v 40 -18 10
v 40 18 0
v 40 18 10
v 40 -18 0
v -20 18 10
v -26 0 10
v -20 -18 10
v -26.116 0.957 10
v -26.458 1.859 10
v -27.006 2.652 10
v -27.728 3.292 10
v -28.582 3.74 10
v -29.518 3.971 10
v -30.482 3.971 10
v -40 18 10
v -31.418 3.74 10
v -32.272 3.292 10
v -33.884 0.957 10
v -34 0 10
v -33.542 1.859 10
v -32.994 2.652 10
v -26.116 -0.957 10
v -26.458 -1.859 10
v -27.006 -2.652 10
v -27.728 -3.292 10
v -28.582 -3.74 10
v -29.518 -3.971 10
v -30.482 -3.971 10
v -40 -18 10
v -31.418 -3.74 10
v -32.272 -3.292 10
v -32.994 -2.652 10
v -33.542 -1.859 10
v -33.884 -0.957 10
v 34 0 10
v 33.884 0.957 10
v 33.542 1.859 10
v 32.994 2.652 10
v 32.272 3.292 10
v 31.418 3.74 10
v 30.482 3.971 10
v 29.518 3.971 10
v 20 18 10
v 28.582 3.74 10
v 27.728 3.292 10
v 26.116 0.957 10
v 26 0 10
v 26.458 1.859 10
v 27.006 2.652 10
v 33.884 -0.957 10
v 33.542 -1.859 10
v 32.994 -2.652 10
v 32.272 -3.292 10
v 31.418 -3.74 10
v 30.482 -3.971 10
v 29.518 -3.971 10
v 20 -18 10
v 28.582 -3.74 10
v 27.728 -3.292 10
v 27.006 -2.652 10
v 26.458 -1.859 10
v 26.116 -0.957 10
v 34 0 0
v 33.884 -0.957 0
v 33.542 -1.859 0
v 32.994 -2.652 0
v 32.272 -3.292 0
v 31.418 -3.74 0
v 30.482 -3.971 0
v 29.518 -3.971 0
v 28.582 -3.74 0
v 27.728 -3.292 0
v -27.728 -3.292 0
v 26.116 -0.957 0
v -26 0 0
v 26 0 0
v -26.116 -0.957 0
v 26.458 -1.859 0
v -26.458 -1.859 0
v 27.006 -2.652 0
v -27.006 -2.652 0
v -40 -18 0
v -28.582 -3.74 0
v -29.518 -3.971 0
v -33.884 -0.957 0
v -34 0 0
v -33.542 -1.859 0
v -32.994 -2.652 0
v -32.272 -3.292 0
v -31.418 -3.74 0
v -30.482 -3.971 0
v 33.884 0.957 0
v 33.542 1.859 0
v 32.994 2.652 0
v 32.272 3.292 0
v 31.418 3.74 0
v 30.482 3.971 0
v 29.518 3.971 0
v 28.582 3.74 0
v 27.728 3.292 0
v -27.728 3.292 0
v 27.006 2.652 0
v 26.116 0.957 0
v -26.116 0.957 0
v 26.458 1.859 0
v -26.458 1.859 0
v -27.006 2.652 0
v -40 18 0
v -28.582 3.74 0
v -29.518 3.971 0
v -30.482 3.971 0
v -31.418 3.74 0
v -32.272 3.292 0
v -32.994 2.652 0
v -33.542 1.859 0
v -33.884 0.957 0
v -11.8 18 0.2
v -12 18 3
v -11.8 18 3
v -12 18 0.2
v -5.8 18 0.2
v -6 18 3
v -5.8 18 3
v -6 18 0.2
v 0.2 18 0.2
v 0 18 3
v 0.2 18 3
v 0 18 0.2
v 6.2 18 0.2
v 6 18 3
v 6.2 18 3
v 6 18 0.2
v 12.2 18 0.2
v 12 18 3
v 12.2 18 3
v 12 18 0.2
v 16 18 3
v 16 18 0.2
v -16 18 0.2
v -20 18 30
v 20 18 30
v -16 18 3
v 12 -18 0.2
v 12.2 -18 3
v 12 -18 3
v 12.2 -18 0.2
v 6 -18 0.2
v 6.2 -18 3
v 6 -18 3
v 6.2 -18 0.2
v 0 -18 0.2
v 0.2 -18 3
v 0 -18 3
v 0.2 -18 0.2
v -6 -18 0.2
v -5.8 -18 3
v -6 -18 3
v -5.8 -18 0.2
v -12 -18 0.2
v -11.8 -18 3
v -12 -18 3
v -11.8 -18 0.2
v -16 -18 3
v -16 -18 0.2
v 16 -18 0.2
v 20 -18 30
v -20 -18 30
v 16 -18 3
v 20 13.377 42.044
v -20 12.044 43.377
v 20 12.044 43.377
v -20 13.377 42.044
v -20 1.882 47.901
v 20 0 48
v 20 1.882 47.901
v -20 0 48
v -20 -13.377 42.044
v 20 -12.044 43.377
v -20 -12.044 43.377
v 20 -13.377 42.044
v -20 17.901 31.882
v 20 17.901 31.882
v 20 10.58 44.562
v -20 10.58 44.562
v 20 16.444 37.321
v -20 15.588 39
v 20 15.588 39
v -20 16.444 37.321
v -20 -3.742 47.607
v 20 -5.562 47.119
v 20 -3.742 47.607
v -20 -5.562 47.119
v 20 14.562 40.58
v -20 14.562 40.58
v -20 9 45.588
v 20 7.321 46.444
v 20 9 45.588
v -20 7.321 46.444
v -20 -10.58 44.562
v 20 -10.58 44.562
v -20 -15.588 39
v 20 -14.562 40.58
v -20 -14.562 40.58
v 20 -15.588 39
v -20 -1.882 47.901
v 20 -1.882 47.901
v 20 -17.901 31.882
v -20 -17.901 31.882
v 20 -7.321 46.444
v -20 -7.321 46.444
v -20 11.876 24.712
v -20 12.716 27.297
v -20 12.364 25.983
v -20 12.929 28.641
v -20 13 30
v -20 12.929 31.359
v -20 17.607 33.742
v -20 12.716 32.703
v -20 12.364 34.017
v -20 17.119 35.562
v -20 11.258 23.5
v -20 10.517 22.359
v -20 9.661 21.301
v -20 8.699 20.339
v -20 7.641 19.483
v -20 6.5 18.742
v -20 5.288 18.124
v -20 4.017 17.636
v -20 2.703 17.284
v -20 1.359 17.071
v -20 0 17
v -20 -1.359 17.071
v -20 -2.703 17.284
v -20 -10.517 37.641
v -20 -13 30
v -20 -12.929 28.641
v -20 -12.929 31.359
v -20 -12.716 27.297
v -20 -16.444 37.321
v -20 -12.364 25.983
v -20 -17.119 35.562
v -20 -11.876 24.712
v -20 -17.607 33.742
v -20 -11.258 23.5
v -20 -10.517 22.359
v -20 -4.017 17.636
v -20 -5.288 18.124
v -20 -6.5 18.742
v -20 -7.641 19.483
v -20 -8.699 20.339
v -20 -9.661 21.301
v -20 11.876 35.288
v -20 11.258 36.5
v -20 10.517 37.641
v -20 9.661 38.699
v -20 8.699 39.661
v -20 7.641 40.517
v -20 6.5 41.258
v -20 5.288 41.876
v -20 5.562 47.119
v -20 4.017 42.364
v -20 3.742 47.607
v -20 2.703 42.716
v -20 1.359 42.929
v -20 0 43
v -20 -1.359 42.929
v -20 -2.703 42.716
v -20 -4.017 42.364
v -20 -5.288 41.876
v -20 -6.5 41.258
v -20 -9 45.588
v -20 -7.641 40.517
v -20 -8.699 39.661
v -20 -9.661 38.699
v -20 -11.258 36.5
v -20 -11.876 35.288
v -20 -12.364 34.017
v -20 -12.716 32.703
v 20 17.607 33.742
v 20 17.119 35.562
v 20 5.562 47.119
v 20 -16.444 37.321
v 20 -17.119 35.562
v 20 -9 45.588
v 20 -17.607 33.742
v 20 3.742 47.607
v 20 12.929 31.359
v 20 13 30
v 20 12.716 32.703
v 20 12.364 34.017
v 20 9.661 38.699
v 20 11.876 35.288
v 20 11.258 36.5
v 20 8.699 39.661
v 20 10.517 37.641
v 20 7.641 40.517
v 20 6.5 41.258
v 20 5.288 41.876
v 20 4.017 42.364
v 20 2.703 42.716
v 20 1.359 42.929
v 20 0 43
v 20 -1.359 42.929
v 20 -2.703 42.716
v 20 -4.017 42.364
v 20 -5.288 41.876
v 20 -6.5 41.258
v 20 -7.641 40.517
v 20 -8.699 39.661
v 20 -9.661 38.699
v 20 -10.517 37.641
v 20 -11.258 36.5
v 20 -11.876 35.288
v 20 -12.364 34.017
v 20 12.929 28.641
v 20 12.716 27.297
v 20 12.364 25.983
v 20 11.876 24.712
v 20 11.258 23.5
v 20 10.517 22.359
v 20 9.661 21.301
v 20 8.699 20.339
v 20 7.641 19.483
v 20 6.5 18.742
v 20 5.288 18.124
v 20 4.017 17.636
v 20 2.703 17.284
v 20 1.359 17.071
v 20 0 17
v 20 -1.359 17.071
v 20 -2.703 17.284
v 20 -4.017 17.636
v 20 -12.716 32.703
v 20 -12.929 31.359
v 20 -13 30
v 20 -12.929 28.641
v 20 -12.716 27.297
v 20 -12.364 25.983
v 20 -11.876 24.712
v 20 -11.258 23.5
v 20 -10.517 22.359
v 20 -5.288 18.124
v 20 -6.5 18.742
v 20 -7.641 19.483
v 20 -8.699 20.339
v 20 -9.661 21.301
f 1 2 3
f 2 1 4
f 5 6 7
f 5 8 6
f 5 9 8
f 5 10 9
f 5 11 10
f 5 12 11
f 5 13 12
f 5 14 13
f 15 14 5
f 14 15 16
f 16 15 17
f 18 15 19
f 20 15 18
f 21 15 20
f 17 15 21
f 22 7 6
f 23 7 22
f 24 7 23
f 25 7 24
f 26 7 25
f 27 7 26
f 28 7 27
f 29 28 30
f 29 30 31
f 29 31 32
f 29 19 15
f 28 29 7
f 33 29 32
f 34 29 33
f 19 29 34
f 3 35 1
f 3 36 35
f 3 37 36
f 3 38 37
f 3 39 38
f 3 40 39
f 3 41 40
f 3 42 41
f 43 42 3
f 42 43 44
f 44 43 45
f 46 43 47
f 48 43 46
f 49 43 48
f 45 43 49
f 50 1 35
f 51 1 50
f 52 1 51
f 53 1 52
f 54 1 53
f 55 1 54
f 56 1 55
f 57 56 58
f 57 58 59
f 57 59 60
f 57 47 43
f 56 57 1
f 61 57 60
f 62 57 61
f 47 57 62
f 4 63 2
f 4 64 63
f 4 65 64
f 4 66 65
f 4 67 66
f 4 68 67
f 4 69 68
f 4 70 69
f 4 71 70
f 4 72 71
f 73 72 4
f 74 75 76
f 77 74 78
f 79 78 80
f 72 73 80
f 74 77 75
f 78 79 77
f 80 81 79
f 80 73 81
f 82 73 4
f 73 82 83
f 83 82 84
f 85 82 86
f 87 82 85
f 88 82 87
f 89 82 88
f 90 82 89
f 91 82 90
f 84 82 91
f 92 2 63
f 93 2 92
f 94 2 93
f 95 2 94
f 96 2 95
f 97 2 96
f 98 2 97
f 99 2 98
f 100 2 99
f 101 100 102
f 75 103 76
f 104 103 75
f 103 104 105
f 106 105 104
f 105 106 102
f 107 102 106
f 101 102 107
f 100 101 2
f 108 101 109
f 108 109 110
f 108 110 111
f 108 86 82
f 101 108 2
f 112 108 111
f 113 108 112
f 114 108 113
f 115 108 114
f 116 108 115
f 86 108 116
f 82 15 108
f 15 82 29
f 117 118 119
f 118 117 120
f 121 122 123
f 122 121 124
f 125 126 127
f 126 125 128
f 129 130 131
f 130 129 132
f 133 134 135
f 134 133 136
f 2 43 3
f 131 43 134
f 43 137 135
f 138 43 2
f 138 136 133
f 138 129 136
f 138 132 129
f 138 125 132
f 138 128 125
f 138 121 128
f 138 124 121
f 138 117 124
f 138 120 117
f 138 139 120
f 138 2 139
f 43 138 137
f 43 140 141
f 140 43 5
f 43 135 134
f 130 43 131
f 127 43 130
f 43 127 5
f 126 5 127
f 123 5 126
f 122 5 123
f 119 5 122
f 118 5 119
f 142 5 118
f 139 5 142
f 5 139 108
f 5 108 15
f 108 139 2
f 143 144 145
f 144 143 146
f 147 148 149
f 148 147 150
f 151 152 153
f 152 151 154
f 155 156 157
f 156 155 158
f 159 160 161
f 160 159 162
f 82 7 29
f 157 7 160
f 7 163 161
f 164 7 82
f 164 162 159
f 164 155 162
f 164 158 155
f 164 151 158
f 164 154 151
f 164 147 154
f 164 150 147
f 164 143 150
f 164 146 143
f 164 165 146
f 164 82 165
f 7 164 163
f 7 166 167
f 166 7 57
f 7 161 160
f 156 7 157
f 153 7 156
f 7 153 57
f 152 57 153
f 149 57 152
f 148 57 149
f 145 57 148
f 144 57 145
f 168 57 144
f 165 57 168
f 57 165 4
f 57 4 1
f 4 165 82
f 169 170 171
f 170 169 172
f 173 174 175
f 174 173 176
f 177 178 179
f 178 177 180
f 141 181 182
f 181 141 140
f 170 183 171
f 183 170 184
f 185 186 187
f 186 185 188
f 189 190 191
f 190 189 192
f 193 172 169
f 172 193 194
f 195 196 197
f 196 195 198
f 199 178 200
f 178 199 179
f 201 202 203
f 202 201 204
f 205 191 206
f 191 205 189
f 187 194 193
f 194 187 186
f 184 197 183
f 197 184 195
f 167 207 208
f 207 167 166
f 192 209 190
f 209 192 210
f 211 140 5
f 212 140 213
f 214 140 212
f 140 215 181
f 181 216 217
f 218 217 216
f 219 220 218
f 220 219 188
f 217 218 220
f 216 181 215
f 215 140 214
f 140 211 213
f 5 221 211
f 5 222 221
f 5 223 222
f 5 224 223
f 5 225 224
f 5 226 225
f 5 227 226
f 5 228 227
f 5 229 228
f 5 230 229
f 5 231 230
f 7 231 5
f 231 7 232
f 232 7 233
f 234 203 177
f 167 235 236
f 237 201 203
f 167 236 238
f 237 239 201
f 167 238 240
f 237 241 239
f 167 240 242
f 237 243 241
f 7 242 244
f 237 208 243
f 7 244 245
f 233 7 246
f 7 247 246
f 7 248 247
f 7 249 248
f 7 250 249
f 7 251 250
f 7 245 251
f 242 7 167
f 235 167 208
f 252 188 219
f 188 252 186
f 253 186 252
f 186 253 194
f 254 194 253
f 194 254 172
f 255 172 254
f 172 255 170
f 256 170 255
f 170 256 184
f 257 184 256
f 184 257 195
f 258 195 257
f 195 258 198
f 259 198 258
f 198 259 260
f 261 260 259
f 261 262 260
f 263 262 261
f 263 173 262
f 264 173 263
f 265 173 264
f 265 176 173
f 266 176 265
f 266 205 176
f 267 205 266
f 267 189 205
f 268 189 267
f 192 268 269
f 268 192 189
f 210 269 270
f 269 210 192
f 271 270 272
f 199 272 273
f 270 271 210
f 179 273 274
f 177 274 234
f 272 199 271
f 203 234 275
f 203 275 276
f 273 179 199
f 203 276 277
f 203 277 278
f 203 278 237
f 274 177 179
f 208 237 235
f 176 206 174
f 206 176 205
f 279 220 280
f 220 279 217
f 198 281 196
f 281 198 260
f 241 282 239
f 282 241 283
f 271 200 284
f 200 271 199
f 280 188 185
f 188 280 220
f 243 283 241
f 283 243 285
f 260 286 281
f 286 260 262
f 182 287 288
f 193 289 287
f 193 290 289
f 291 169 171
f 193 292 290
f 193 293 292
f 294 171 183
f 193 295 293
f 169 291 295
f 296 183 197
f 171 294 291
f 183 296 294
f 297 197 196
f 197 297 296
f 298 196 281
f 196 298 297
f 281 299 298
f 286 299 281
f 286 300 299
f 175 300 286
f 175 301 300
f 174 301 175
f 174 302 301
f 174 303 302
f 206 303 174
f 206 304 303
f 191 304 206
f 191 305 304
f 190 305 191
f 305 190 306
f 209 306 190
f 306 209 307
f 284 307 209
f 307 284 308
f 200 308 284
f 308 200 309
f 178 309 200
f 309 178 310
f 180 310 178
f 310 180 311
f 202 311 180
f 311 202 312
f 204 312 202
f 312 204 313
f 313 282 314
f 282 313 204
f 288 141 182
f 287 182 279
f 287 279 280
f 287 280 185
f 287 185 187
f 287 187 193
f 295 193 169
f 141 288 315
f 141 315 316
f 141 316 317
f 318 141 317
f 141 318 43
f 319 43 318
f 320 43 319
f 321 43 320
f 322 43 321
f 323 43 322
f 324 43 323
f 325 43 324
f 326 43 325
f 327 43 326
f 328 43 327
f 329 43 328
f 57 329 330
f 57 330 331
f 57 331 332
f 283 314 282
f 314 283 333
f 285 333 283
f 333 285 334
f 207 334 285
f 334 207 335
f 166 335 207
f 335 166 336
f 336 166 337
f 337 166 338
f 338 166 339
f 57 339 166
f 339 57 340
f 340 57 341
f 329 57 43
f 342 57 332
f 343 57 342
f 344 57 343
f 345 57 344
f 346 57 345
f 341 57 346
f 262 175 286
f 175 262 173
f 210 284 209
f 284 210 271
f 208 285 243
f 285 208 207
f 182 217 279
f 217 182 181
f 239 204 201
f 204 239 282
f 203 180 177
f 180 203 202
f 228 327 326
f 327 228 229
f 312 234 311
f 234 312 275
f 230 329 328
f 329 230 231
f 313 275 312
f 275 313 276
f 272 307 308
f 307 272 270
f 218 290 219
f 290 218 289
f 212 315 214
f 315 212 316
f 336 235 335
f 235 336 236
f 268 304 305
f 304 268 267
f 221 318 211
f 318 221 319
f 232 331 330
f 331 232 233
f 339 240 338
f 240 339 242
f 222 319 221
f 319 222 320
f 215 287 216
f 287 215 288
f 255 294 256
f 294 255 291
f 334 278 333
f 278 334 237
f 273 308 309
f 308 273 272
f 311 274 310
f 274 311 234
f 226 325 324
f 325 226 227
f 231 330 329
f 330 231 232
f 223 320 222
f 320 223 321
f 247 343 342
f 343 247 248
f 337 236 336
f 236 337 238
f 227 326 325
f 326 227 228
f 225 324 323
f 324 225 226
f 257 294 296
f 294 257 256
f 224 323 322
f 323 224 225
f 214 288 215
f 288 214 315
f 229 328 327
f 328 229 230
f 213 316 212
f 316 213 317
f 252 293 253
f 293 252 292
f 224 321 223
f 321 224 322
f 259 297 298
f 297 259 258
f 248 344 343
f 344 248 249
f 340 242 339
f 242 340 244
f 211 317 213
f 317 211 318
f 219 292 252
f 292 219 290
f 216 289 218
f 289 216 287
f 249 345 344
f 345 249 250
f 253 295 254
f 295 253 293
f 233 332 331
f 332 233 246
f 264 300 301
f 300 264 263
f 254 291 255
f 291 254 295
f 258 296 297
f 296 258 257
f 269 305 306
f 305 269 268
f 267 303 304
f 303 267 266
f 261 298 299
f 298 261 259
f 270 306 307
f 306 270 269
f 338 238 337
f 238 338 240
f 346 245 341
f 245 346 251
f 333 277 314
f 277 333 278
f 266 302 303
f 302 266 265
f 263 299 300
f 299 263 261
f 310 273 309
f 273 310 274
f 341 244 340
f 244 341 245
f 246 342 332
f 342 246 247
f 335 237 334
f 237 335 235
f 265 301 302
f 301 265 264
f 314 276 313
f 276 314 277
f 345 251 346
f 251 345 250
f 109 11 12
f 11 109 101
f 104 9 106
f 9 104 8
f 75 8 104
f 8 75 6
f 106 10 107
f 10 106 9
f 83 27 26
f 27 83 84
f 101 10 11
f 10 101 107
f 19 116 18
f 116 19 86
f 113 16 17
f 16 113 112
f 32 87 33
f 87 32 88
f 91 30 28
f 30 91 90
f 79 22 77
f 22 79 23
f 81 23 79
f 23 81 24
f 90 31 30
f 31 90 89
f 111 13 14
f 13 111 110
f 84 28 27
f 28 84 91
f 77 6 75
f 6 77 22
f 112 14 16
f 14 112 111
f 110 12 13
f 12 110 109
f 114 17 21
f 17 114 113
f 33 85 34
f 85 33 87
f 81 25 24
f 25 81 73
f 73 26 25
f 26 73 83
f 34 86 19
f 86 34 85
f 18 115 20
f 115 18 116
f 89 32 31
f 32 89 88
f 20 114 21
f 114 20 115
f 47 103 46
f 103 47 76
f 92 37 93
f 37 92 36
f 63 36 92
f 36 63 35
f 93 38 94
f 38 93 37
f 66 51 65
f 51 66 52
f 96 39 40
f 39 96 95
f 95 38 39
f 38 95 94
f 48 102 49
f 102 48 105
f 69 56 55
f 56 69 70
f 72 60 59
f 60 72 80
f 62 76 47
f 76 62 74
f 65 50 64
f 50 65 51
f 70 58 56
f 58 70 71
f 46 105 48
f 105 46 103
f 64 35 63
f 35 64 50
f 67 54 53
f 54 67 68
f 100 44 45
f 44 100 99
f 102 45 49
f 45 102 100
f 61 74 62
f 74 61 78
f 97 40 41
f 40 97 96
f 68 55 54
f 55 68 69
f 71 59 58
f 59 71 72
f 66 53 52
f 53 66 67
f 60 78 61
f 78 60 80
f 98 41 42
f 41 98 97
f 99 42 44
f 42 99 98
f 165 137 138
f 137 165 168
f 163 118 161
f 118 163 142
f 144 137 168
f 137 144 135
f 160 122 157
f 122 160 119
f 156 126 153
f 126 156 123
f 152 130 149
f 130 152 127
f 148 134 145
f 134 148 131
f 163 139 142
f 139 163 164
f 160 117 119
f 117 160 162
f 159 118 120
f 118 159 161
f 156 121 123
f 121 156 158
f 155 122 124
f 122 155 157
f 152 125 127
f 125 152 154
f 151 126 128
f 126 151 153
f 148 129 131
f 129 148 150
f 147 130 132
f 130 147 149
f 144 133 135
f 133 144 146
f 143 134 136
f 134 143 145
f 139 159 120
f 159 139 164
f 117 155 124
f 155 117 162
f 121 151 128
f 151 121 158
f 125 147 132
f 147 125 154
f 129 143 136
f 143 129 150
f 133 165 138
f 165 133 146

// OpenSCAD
use <../../config.scad>

$fs=$fs/2;
$fa=$fa/2;

//translate([100,-70+x,0]) import("component/pi_model_v4.stl");
//translate([-100,59,0])  rotate([90,0,0]) import("component/screen_fond.stl");

screen_l = 193;
screen_lg = 111;
screen_r = 7;

trou_l = 126;
trou_lg = 65;
d_e1 = 2;
d_e2 = 1;
screen_vis = [[trou_l/2+d_e1, trou_lg/2+d_e2], [trou_l/2+d_e1, -trou_lg/2+d_e2]
    , [-trou_l/2+d_e1, trou_lg/2+d_e2], [-trou_l/2+d_e1, -trou_lg/2+d_e2]];


boitier_l = 197;
boitier_lg = 155;
boitier_y = -boitier_lg/2-10;

boitier_vis_l = boitier_l/2-5;
boitier_vis_lg = boitier_lg/2-5;

boitier_h = 40;

vis_r1 = 2.2;
vis_r2 = 4.2;

x =0;


y_camera = -boitier_lg/2+6;

//$fn=50;

module usb(){
    usb_l = 28;
    usb_r = 12/2;
    union(){
        hull(){
            for(i=[-1,1]){
                translate([i*usb_l/2, 0,-20])cylinder(r=usb_r, 20);
            }
        }
        for(i=[-1,1]){
            translate([i*usb_l/2, 0,-1])cylinder(r=1.5, 20);
        }
    }
    
    cube([15,10,6], center= true);
}

module screen_int(){
    screen_l_int = 110;
    screen_lg_int = 90;
    r_int = 10;
    for(vis = screen_vis){
        translate(vis) cylinder(r=2, 20);
    }
    hull(){
        for(i=[-1,1]){
            for(j=[-1,1]){
                translate([i*(screen_l_int/2-r_int)+d_e1, j*(screen_lg_int/2-r_int)+d_e2, 0]) cylinder(r=r_int, 20);
            }
        }
    }
}

module screen(){
    screen_e = 1;
    screen_y = 66;
    
    screen_l_cube = 175;
    screen_lg_cube = 107;
    
    union(){
        hull(){
            for(i=[-1,1]){
                for(j=[-1,1]){
                    translate([i*(screen_l/2-screen_r), j*(screen_lg/2-screen_r), 0]) cylinder(r=screen_r, screen_e);
                }
            }
        }
        translate([-screen_l_cube/2,-screen_lg_cube/2,0]) cube([screen_l_cube,screen_lg_cube, 8.5]);
        translate([-screen_l_cube/2-7,-screen_lg_cube/2,0]) cube([screen_l_cube,screen_lg_cube, 3]);
    
        screen_int();
    }
}

module boitier(h){
    r = 6;
    difference(){
        hull(){
            for(i=[-1,1]){
                for(j=[-1,1]){
                    translate([i*(boitier_l/2-r), j*(boitier_lg/2-r), 0]) cylinder(r=r, h);
                }
            }
        }
    }
        
}


module screen_fond(){
    e = 9.5;
    l = 200;
    lg = 150;
    difference(){
        boitier(e);
        translate([0,x,e+0.1]) mirror([0,0,1])screen();
        
        for(i=[-1,1]){
            for(j=[-1,1]){
                translate([i*(boitier_vis_l), j*(boitier_vis_lg), -1]) cylinder(r=vis_r1, 100);
            }
        }
        
    }
    
    for(i=[-1,1]){
        hull(){
           translate([-boitier_l/2+10,i*65,1]) mirror([0,0,1])cube([boitier_l-20, 2, 1]); 
           translate([-boitier_l/2+20,i*65,21]) mirror([0,0,1])cube([boitier_l-40, 2, 1]);  
        }
    }
}

module screen_up(){
    e = 1.5;
    r = 6;
   difference(){
        mirror([0,1,0])boitier(boitier_h);
        translate([0,0,e+0.1]) rotate([180,0,0]) screen_int();
        hull(){
            for(i=[-1,1]){
                for(j=[-1,1]){
                    translate([i*(boitier_l/2-15), -(boitier_lg/2-15), e]) cylinder(r=5, boitier_h+2);
                    translate([i*(boitier_l/2-15), (boitier_lg/2-15), e]) cylinder(r=5, boitier_h+2);
                }
            }
        }
        
        for(i=[-2:2]){
            hull(){
                translate([boitier_l/2,i*10,10]) rotate([0,90,0])cylinder(r=3, boitier_l/2, center = true);
                translate([boitier_l/2,i*10,boitier_h-10]) rotate([0,90,0])cylinder(r=3, boitier_l/2, center = true);
            }
        }
        
        hull(){
            for(i=[-2:2]){
            translate([-boitier_l/2,i*10,10]) rotate([0,90,0])cylinder(r=3, boitier_l/2, center = true);
            translate([-boitier_l/2,i*10,boitier_h-10]) rotate([0,90,0])cylinder(r=3, boitier_l/2, center = true);
            }
        }
        
         for(i=[-1,1]){
            hull(){
                translate([i*25,0,boitier_h/2]) rotate([-90,0,0])cylinder(r=3.2, 1000, center=true);
                
            }
        }
        
        for(i=[0,1]){
            for(j=[0,1]){
                mirror([i,0]) mirror([0,j])
                    translate([boitier_vis_l, boitier_vis_lg, 10]) rotate([0,0,225])support_nut(3, 11, 11);
            }
        }
        
        for(i=[0,1]){
            for(j=[0,1]){
                mirror([i,0]) mirror([0,j])
                    translate([boitier_vis_l, boitier_vis_lg, boitier_h-10]) rotate([0,0,225])support_nut(3, 11, 11);
                
                mirror([i,0]) mirror([0,j])
                translate([-boitier_l/2+2, 45, boitier_h/2]) rotate([90,0,-90])usb();
            }
            
            
        
        }
        
        for(i=[-0.1, -0.3, 0.1, 0.3]){
            hull(){
                translate([i*boitier_l,0,boitier_h-8]) rotate([90,0,0])cylinder(r=2, 1000);
                
            }
        }
        
        

    }
    
    
}


module screen_up2(){
    e = 1.5;
    r = 6;
    de = 15;
    fond_h = 25;
    difference(){
        mirror([0,1,0])boitier(fond_h);
        
        hull(){
            for(i=[-1,1]){
                for(j=[-1,1]){
                    translate([i*(boitier_l/2-de), -(boitier_lg/2-r-e), e]) cylinder(r=5, fond_h+2);
                    translate([i*(boitier_l/2-r-e), -(boitier_lg/2-de), e]) cylinder(r=5, fond_h+2);
                    translate([i*(boitier_l/2-de), (boitier_lg/2-r-e), e]) cylinder(r=5, fond_h+2);
                    translate([i*(boitier_l/2-r-e), (boitier_lg/2-de), e]) cylinder(r=5, fond_h+2);
                }
            }
        }

        
        for(i=[0,1]){
            for(j=[0,1]){
                mirror([i,0]) mirror([0,j])
                    translate([boitier_vis_l, boitier_vis_lg, -1]) cylinder(r=1.6, 100);
            }
        }
        
        
        for(i=[-1,0,1]){
            translate([boitier_l/2, 10-i*20, fond_h/2]) rotate([0,90,0])cylinder(r=4, 10, center = true);
        }
        
        translate([boitier_l/2, -35, fond_h/2]) cube([100,15,10], center = true);
        
        hull(){
            for(i=[-1,1]){
                translate([-i*30, 50, 0]) cylinder(r=4, 10, center = true);
            }
        }
        
        hull(){
            for(i=[-1,1]){
                translate([-i*30, -50, 0]) cylinder(r=4, 10, center = true);
            }
        }
        

    }
    
    
}



z_rond = 20;
support_camera_rond_r = 10;
module support_camera1(){
    e = 5;
    z= z_rond;
    r1 = 5;
    z1 = 10;
    difference(){
        union(){
            hull(){
                translate([-25,0, 0])  cylinder(r=5, e);
                translate([25,0, 0])  cylinder(r=5, e);
                
                cylinder(r=10, e);
                
            }
            
            hull(){
                translate([0,0, z1])  sphere(r=r1); cylinder(r=10, e);
                
            }
            
             hull(){
                translate([0,0, z])  sphere(r=support_camera_rond_r); 
                translate([0,0, z1])  sphere(r=r1); 
                
            }
        }
        translate([-25,0, -1])  cylinder(r=2, e+2);
        translate([25,0, -1])  cylinder(r=2, e+2);
        
        hull(){
            translate([-12.5, 2, -1]) cube([25,100,2]);
            translate([0,8, 10]) rotate([0,90,0]) cylinder(r=2, 25, center=true);
        }
                
    }
}

module support_camera2(){
    e=3;
    l=38;
    l3=20;
    l2=18;
    r = 4;
    
    dz_rond = 12;
    difference(){
        union(){
            for(i=[0,1]){
                mirror([i,0,0]) translate([l2/2,-l3/2,0])cube([e, l3, l]);
            }
            translate([-l2/2-e,-l3/2,0])cube([l2+2*e, l, e]);
        }
        translate([0,0, z_rond])  rotate([0,90,0])cylinder(r=r, l+e+10, center = true);
        translate([0,0, z_rond - dz_rond])  rotate([0,90,0])cylinder(r=2, l+e+10, center = true);
        translate([0,0, z_rond + dz_rond])  rotate([0,90,0])cylinder(r=2, l+e+10, center = true);
            
        
    }
    
    %translate([0,0, z_rond + dz_rond])  rotate([0,90,0])cylinder(r=2, l+e+10, center = true);
    %translate([0,0, z_rond - dz_rond])  rotate([0,90,0])cylinder(r=2, l+e+10, center = true);
        
    z= 15;
    r1 = 5;
    z1 = 10;
    
}

nb_cran = 24;

module support_ecran1(){
    r1 = 17;
    r2 = 12;
    h = 15+6;
    
    difference(){
        union(){
            hull(){
                translate([-35,0])rotate([0,0,0])cylinder(r=8,5);
                translate([35,0])rotate([0,0,0])cylinder(r=8,5);
                translate([-r1,-r1,0])cube([r1*2,r1*2,5]);
                
                //translate([-r1,-r1,0])cube([r1*2,r1*2,r1*2]);
            }
            for(i=[0,1]){
                mirror([i,0,0])hull(){
                    translate([r2,-r1,0])cube([5,r1*2,6]);
                    translate([r2,0,h])rotate([0,90,0])cylinder(r=8,5);
                }
                mirror([i,0,0])
                    translate([r2,0,h])rotate([0,-90,0]) sphere_cran(8, 1.1, 0.1, nb_cran);
            }
        }
        translate([0,0,h])rotate([0,90,0])cylinder(r=4.2,3*r1, center = true);   
        //translate([-r2,-r1,6])cube([r2*2,r1*2,60]);
        translate([35,0])rotate([0,0,0])cylinder(r=4,40);
        translate([-35,0])rotate([0,0,0])cylinder(r=4,40);
            
    }
}





module support_ecran2(){
    e=3;
    l=38;
    l3=20;
    l2=18;
    r = 4;
    
    dz_rond = 12;
    r1 = 10;
    difference(){
        union(){
            rotate([-90,0,0])cylinder(r=10,100);
            translate([-r1/2,0,-10])cube([r1,100,2]);  
            translate([-r1,-r1,-r1])cube([20,20,20]);
            for(i=[0,1]){
                mirror([i,0,0])
                translate([-r1,0,0])rotate([0,-90,0]) rotate([0, 0, 180/nb_cran]) sphere_cran(8, 1.1, 0.1, nb_cran); 
            }
        }
        rotate([0,90,0])cylinder(r=4.2,100, center=true); 
    }
}

module support_cabine_ih(){
    x = 30;
    r2=26/2;
    r=r2+5;
    e_2 = 60;
    difference(){
        union(){
            translate([-40,-r,0])cube([80, 2*r, 10]);
            hull(){
                translate([-20,-r,0])cube([40, 2*r, 10]);
                translate([-20,0, x])rotate([0,90,0]) cylinder(r=r,40);
            }
        }
        translate([-30,0,x])rotate([0,90,0]) cylinder(r=r2,60);
        
        translate([-e_2/2,0,-1])cylinder(r=4,60);
        translate([e_2/2,0,-1])cylinder(r=4,60);
        cube([32, 100, 6], center=true);
    }
    
    for(i=[-12, -6 ,0, 6, 12]){
        translate([i,-r, 0]) cube([0.2, 2*r, 10]);
    }
    translate([-20,-r, 0]) cube([40, 2*r, 0.2]);
}

module support_cabine_ih2(){
    x = 30;
    r2=26/2;
    r=r2+5;
    e_2 = 50;
    h = 14;
    e = 7;
    difference(){
        translate([-35,-r,0])cube([70, 2*r, h]);
        
        translate([-e_2/2,0,-1])cylinder(r=3.2,60);
        translate([e_2/2,0,-1])cylinder(r=3.2,60);
        cube([32, 100, e*2], center=true);
    }
    
    for(i=[-12, -6 ,0, 6, 12]){
        translate([i,-r, 0]) cube([0.2, 2*r, 10]);
    }
    translate([-20,-r, 0]) cube([40, 2*r, 0.2]);
}

mode = 8;
if(mode==0){
    //translate([0, -x, -10.2])screen();
    //rotate([0,0,180]) translate([100,-70-x,10]) color("blue") import("component/pi_model_v4.stl");
    //translate([20,-70/3,10]) color("blue") cube([70,55,20]);
    
    translate([0,0,0.2])screen_up();
    rotate([0,180,180])screen_fond();
    translate([0,0,boitier_h+1]) screen_up2();
    
    /*translate([0,-y_camera+10,boitier_h/2]) rotate([-90,0,0]) support_ecran1();
    translate([0,-y_camera+31,boitier_h/2]) rotate([-360/nb_cran,0,0]) support_ecran2();*/
    
} else if(mode==1){
    screen_up();
} else if(mode==2){
    screen_up2();
} else if(mode==3){
    screen_fond();
} else if(mode==4){
    support_ecran1();
} else if(mode==5){
    support_ecran2();
} else if(mode==6){
    support_camera1();
} else if(mode==7){
    support_camera2();
} else if(mode==8){
    support_cabine_ih();
}
